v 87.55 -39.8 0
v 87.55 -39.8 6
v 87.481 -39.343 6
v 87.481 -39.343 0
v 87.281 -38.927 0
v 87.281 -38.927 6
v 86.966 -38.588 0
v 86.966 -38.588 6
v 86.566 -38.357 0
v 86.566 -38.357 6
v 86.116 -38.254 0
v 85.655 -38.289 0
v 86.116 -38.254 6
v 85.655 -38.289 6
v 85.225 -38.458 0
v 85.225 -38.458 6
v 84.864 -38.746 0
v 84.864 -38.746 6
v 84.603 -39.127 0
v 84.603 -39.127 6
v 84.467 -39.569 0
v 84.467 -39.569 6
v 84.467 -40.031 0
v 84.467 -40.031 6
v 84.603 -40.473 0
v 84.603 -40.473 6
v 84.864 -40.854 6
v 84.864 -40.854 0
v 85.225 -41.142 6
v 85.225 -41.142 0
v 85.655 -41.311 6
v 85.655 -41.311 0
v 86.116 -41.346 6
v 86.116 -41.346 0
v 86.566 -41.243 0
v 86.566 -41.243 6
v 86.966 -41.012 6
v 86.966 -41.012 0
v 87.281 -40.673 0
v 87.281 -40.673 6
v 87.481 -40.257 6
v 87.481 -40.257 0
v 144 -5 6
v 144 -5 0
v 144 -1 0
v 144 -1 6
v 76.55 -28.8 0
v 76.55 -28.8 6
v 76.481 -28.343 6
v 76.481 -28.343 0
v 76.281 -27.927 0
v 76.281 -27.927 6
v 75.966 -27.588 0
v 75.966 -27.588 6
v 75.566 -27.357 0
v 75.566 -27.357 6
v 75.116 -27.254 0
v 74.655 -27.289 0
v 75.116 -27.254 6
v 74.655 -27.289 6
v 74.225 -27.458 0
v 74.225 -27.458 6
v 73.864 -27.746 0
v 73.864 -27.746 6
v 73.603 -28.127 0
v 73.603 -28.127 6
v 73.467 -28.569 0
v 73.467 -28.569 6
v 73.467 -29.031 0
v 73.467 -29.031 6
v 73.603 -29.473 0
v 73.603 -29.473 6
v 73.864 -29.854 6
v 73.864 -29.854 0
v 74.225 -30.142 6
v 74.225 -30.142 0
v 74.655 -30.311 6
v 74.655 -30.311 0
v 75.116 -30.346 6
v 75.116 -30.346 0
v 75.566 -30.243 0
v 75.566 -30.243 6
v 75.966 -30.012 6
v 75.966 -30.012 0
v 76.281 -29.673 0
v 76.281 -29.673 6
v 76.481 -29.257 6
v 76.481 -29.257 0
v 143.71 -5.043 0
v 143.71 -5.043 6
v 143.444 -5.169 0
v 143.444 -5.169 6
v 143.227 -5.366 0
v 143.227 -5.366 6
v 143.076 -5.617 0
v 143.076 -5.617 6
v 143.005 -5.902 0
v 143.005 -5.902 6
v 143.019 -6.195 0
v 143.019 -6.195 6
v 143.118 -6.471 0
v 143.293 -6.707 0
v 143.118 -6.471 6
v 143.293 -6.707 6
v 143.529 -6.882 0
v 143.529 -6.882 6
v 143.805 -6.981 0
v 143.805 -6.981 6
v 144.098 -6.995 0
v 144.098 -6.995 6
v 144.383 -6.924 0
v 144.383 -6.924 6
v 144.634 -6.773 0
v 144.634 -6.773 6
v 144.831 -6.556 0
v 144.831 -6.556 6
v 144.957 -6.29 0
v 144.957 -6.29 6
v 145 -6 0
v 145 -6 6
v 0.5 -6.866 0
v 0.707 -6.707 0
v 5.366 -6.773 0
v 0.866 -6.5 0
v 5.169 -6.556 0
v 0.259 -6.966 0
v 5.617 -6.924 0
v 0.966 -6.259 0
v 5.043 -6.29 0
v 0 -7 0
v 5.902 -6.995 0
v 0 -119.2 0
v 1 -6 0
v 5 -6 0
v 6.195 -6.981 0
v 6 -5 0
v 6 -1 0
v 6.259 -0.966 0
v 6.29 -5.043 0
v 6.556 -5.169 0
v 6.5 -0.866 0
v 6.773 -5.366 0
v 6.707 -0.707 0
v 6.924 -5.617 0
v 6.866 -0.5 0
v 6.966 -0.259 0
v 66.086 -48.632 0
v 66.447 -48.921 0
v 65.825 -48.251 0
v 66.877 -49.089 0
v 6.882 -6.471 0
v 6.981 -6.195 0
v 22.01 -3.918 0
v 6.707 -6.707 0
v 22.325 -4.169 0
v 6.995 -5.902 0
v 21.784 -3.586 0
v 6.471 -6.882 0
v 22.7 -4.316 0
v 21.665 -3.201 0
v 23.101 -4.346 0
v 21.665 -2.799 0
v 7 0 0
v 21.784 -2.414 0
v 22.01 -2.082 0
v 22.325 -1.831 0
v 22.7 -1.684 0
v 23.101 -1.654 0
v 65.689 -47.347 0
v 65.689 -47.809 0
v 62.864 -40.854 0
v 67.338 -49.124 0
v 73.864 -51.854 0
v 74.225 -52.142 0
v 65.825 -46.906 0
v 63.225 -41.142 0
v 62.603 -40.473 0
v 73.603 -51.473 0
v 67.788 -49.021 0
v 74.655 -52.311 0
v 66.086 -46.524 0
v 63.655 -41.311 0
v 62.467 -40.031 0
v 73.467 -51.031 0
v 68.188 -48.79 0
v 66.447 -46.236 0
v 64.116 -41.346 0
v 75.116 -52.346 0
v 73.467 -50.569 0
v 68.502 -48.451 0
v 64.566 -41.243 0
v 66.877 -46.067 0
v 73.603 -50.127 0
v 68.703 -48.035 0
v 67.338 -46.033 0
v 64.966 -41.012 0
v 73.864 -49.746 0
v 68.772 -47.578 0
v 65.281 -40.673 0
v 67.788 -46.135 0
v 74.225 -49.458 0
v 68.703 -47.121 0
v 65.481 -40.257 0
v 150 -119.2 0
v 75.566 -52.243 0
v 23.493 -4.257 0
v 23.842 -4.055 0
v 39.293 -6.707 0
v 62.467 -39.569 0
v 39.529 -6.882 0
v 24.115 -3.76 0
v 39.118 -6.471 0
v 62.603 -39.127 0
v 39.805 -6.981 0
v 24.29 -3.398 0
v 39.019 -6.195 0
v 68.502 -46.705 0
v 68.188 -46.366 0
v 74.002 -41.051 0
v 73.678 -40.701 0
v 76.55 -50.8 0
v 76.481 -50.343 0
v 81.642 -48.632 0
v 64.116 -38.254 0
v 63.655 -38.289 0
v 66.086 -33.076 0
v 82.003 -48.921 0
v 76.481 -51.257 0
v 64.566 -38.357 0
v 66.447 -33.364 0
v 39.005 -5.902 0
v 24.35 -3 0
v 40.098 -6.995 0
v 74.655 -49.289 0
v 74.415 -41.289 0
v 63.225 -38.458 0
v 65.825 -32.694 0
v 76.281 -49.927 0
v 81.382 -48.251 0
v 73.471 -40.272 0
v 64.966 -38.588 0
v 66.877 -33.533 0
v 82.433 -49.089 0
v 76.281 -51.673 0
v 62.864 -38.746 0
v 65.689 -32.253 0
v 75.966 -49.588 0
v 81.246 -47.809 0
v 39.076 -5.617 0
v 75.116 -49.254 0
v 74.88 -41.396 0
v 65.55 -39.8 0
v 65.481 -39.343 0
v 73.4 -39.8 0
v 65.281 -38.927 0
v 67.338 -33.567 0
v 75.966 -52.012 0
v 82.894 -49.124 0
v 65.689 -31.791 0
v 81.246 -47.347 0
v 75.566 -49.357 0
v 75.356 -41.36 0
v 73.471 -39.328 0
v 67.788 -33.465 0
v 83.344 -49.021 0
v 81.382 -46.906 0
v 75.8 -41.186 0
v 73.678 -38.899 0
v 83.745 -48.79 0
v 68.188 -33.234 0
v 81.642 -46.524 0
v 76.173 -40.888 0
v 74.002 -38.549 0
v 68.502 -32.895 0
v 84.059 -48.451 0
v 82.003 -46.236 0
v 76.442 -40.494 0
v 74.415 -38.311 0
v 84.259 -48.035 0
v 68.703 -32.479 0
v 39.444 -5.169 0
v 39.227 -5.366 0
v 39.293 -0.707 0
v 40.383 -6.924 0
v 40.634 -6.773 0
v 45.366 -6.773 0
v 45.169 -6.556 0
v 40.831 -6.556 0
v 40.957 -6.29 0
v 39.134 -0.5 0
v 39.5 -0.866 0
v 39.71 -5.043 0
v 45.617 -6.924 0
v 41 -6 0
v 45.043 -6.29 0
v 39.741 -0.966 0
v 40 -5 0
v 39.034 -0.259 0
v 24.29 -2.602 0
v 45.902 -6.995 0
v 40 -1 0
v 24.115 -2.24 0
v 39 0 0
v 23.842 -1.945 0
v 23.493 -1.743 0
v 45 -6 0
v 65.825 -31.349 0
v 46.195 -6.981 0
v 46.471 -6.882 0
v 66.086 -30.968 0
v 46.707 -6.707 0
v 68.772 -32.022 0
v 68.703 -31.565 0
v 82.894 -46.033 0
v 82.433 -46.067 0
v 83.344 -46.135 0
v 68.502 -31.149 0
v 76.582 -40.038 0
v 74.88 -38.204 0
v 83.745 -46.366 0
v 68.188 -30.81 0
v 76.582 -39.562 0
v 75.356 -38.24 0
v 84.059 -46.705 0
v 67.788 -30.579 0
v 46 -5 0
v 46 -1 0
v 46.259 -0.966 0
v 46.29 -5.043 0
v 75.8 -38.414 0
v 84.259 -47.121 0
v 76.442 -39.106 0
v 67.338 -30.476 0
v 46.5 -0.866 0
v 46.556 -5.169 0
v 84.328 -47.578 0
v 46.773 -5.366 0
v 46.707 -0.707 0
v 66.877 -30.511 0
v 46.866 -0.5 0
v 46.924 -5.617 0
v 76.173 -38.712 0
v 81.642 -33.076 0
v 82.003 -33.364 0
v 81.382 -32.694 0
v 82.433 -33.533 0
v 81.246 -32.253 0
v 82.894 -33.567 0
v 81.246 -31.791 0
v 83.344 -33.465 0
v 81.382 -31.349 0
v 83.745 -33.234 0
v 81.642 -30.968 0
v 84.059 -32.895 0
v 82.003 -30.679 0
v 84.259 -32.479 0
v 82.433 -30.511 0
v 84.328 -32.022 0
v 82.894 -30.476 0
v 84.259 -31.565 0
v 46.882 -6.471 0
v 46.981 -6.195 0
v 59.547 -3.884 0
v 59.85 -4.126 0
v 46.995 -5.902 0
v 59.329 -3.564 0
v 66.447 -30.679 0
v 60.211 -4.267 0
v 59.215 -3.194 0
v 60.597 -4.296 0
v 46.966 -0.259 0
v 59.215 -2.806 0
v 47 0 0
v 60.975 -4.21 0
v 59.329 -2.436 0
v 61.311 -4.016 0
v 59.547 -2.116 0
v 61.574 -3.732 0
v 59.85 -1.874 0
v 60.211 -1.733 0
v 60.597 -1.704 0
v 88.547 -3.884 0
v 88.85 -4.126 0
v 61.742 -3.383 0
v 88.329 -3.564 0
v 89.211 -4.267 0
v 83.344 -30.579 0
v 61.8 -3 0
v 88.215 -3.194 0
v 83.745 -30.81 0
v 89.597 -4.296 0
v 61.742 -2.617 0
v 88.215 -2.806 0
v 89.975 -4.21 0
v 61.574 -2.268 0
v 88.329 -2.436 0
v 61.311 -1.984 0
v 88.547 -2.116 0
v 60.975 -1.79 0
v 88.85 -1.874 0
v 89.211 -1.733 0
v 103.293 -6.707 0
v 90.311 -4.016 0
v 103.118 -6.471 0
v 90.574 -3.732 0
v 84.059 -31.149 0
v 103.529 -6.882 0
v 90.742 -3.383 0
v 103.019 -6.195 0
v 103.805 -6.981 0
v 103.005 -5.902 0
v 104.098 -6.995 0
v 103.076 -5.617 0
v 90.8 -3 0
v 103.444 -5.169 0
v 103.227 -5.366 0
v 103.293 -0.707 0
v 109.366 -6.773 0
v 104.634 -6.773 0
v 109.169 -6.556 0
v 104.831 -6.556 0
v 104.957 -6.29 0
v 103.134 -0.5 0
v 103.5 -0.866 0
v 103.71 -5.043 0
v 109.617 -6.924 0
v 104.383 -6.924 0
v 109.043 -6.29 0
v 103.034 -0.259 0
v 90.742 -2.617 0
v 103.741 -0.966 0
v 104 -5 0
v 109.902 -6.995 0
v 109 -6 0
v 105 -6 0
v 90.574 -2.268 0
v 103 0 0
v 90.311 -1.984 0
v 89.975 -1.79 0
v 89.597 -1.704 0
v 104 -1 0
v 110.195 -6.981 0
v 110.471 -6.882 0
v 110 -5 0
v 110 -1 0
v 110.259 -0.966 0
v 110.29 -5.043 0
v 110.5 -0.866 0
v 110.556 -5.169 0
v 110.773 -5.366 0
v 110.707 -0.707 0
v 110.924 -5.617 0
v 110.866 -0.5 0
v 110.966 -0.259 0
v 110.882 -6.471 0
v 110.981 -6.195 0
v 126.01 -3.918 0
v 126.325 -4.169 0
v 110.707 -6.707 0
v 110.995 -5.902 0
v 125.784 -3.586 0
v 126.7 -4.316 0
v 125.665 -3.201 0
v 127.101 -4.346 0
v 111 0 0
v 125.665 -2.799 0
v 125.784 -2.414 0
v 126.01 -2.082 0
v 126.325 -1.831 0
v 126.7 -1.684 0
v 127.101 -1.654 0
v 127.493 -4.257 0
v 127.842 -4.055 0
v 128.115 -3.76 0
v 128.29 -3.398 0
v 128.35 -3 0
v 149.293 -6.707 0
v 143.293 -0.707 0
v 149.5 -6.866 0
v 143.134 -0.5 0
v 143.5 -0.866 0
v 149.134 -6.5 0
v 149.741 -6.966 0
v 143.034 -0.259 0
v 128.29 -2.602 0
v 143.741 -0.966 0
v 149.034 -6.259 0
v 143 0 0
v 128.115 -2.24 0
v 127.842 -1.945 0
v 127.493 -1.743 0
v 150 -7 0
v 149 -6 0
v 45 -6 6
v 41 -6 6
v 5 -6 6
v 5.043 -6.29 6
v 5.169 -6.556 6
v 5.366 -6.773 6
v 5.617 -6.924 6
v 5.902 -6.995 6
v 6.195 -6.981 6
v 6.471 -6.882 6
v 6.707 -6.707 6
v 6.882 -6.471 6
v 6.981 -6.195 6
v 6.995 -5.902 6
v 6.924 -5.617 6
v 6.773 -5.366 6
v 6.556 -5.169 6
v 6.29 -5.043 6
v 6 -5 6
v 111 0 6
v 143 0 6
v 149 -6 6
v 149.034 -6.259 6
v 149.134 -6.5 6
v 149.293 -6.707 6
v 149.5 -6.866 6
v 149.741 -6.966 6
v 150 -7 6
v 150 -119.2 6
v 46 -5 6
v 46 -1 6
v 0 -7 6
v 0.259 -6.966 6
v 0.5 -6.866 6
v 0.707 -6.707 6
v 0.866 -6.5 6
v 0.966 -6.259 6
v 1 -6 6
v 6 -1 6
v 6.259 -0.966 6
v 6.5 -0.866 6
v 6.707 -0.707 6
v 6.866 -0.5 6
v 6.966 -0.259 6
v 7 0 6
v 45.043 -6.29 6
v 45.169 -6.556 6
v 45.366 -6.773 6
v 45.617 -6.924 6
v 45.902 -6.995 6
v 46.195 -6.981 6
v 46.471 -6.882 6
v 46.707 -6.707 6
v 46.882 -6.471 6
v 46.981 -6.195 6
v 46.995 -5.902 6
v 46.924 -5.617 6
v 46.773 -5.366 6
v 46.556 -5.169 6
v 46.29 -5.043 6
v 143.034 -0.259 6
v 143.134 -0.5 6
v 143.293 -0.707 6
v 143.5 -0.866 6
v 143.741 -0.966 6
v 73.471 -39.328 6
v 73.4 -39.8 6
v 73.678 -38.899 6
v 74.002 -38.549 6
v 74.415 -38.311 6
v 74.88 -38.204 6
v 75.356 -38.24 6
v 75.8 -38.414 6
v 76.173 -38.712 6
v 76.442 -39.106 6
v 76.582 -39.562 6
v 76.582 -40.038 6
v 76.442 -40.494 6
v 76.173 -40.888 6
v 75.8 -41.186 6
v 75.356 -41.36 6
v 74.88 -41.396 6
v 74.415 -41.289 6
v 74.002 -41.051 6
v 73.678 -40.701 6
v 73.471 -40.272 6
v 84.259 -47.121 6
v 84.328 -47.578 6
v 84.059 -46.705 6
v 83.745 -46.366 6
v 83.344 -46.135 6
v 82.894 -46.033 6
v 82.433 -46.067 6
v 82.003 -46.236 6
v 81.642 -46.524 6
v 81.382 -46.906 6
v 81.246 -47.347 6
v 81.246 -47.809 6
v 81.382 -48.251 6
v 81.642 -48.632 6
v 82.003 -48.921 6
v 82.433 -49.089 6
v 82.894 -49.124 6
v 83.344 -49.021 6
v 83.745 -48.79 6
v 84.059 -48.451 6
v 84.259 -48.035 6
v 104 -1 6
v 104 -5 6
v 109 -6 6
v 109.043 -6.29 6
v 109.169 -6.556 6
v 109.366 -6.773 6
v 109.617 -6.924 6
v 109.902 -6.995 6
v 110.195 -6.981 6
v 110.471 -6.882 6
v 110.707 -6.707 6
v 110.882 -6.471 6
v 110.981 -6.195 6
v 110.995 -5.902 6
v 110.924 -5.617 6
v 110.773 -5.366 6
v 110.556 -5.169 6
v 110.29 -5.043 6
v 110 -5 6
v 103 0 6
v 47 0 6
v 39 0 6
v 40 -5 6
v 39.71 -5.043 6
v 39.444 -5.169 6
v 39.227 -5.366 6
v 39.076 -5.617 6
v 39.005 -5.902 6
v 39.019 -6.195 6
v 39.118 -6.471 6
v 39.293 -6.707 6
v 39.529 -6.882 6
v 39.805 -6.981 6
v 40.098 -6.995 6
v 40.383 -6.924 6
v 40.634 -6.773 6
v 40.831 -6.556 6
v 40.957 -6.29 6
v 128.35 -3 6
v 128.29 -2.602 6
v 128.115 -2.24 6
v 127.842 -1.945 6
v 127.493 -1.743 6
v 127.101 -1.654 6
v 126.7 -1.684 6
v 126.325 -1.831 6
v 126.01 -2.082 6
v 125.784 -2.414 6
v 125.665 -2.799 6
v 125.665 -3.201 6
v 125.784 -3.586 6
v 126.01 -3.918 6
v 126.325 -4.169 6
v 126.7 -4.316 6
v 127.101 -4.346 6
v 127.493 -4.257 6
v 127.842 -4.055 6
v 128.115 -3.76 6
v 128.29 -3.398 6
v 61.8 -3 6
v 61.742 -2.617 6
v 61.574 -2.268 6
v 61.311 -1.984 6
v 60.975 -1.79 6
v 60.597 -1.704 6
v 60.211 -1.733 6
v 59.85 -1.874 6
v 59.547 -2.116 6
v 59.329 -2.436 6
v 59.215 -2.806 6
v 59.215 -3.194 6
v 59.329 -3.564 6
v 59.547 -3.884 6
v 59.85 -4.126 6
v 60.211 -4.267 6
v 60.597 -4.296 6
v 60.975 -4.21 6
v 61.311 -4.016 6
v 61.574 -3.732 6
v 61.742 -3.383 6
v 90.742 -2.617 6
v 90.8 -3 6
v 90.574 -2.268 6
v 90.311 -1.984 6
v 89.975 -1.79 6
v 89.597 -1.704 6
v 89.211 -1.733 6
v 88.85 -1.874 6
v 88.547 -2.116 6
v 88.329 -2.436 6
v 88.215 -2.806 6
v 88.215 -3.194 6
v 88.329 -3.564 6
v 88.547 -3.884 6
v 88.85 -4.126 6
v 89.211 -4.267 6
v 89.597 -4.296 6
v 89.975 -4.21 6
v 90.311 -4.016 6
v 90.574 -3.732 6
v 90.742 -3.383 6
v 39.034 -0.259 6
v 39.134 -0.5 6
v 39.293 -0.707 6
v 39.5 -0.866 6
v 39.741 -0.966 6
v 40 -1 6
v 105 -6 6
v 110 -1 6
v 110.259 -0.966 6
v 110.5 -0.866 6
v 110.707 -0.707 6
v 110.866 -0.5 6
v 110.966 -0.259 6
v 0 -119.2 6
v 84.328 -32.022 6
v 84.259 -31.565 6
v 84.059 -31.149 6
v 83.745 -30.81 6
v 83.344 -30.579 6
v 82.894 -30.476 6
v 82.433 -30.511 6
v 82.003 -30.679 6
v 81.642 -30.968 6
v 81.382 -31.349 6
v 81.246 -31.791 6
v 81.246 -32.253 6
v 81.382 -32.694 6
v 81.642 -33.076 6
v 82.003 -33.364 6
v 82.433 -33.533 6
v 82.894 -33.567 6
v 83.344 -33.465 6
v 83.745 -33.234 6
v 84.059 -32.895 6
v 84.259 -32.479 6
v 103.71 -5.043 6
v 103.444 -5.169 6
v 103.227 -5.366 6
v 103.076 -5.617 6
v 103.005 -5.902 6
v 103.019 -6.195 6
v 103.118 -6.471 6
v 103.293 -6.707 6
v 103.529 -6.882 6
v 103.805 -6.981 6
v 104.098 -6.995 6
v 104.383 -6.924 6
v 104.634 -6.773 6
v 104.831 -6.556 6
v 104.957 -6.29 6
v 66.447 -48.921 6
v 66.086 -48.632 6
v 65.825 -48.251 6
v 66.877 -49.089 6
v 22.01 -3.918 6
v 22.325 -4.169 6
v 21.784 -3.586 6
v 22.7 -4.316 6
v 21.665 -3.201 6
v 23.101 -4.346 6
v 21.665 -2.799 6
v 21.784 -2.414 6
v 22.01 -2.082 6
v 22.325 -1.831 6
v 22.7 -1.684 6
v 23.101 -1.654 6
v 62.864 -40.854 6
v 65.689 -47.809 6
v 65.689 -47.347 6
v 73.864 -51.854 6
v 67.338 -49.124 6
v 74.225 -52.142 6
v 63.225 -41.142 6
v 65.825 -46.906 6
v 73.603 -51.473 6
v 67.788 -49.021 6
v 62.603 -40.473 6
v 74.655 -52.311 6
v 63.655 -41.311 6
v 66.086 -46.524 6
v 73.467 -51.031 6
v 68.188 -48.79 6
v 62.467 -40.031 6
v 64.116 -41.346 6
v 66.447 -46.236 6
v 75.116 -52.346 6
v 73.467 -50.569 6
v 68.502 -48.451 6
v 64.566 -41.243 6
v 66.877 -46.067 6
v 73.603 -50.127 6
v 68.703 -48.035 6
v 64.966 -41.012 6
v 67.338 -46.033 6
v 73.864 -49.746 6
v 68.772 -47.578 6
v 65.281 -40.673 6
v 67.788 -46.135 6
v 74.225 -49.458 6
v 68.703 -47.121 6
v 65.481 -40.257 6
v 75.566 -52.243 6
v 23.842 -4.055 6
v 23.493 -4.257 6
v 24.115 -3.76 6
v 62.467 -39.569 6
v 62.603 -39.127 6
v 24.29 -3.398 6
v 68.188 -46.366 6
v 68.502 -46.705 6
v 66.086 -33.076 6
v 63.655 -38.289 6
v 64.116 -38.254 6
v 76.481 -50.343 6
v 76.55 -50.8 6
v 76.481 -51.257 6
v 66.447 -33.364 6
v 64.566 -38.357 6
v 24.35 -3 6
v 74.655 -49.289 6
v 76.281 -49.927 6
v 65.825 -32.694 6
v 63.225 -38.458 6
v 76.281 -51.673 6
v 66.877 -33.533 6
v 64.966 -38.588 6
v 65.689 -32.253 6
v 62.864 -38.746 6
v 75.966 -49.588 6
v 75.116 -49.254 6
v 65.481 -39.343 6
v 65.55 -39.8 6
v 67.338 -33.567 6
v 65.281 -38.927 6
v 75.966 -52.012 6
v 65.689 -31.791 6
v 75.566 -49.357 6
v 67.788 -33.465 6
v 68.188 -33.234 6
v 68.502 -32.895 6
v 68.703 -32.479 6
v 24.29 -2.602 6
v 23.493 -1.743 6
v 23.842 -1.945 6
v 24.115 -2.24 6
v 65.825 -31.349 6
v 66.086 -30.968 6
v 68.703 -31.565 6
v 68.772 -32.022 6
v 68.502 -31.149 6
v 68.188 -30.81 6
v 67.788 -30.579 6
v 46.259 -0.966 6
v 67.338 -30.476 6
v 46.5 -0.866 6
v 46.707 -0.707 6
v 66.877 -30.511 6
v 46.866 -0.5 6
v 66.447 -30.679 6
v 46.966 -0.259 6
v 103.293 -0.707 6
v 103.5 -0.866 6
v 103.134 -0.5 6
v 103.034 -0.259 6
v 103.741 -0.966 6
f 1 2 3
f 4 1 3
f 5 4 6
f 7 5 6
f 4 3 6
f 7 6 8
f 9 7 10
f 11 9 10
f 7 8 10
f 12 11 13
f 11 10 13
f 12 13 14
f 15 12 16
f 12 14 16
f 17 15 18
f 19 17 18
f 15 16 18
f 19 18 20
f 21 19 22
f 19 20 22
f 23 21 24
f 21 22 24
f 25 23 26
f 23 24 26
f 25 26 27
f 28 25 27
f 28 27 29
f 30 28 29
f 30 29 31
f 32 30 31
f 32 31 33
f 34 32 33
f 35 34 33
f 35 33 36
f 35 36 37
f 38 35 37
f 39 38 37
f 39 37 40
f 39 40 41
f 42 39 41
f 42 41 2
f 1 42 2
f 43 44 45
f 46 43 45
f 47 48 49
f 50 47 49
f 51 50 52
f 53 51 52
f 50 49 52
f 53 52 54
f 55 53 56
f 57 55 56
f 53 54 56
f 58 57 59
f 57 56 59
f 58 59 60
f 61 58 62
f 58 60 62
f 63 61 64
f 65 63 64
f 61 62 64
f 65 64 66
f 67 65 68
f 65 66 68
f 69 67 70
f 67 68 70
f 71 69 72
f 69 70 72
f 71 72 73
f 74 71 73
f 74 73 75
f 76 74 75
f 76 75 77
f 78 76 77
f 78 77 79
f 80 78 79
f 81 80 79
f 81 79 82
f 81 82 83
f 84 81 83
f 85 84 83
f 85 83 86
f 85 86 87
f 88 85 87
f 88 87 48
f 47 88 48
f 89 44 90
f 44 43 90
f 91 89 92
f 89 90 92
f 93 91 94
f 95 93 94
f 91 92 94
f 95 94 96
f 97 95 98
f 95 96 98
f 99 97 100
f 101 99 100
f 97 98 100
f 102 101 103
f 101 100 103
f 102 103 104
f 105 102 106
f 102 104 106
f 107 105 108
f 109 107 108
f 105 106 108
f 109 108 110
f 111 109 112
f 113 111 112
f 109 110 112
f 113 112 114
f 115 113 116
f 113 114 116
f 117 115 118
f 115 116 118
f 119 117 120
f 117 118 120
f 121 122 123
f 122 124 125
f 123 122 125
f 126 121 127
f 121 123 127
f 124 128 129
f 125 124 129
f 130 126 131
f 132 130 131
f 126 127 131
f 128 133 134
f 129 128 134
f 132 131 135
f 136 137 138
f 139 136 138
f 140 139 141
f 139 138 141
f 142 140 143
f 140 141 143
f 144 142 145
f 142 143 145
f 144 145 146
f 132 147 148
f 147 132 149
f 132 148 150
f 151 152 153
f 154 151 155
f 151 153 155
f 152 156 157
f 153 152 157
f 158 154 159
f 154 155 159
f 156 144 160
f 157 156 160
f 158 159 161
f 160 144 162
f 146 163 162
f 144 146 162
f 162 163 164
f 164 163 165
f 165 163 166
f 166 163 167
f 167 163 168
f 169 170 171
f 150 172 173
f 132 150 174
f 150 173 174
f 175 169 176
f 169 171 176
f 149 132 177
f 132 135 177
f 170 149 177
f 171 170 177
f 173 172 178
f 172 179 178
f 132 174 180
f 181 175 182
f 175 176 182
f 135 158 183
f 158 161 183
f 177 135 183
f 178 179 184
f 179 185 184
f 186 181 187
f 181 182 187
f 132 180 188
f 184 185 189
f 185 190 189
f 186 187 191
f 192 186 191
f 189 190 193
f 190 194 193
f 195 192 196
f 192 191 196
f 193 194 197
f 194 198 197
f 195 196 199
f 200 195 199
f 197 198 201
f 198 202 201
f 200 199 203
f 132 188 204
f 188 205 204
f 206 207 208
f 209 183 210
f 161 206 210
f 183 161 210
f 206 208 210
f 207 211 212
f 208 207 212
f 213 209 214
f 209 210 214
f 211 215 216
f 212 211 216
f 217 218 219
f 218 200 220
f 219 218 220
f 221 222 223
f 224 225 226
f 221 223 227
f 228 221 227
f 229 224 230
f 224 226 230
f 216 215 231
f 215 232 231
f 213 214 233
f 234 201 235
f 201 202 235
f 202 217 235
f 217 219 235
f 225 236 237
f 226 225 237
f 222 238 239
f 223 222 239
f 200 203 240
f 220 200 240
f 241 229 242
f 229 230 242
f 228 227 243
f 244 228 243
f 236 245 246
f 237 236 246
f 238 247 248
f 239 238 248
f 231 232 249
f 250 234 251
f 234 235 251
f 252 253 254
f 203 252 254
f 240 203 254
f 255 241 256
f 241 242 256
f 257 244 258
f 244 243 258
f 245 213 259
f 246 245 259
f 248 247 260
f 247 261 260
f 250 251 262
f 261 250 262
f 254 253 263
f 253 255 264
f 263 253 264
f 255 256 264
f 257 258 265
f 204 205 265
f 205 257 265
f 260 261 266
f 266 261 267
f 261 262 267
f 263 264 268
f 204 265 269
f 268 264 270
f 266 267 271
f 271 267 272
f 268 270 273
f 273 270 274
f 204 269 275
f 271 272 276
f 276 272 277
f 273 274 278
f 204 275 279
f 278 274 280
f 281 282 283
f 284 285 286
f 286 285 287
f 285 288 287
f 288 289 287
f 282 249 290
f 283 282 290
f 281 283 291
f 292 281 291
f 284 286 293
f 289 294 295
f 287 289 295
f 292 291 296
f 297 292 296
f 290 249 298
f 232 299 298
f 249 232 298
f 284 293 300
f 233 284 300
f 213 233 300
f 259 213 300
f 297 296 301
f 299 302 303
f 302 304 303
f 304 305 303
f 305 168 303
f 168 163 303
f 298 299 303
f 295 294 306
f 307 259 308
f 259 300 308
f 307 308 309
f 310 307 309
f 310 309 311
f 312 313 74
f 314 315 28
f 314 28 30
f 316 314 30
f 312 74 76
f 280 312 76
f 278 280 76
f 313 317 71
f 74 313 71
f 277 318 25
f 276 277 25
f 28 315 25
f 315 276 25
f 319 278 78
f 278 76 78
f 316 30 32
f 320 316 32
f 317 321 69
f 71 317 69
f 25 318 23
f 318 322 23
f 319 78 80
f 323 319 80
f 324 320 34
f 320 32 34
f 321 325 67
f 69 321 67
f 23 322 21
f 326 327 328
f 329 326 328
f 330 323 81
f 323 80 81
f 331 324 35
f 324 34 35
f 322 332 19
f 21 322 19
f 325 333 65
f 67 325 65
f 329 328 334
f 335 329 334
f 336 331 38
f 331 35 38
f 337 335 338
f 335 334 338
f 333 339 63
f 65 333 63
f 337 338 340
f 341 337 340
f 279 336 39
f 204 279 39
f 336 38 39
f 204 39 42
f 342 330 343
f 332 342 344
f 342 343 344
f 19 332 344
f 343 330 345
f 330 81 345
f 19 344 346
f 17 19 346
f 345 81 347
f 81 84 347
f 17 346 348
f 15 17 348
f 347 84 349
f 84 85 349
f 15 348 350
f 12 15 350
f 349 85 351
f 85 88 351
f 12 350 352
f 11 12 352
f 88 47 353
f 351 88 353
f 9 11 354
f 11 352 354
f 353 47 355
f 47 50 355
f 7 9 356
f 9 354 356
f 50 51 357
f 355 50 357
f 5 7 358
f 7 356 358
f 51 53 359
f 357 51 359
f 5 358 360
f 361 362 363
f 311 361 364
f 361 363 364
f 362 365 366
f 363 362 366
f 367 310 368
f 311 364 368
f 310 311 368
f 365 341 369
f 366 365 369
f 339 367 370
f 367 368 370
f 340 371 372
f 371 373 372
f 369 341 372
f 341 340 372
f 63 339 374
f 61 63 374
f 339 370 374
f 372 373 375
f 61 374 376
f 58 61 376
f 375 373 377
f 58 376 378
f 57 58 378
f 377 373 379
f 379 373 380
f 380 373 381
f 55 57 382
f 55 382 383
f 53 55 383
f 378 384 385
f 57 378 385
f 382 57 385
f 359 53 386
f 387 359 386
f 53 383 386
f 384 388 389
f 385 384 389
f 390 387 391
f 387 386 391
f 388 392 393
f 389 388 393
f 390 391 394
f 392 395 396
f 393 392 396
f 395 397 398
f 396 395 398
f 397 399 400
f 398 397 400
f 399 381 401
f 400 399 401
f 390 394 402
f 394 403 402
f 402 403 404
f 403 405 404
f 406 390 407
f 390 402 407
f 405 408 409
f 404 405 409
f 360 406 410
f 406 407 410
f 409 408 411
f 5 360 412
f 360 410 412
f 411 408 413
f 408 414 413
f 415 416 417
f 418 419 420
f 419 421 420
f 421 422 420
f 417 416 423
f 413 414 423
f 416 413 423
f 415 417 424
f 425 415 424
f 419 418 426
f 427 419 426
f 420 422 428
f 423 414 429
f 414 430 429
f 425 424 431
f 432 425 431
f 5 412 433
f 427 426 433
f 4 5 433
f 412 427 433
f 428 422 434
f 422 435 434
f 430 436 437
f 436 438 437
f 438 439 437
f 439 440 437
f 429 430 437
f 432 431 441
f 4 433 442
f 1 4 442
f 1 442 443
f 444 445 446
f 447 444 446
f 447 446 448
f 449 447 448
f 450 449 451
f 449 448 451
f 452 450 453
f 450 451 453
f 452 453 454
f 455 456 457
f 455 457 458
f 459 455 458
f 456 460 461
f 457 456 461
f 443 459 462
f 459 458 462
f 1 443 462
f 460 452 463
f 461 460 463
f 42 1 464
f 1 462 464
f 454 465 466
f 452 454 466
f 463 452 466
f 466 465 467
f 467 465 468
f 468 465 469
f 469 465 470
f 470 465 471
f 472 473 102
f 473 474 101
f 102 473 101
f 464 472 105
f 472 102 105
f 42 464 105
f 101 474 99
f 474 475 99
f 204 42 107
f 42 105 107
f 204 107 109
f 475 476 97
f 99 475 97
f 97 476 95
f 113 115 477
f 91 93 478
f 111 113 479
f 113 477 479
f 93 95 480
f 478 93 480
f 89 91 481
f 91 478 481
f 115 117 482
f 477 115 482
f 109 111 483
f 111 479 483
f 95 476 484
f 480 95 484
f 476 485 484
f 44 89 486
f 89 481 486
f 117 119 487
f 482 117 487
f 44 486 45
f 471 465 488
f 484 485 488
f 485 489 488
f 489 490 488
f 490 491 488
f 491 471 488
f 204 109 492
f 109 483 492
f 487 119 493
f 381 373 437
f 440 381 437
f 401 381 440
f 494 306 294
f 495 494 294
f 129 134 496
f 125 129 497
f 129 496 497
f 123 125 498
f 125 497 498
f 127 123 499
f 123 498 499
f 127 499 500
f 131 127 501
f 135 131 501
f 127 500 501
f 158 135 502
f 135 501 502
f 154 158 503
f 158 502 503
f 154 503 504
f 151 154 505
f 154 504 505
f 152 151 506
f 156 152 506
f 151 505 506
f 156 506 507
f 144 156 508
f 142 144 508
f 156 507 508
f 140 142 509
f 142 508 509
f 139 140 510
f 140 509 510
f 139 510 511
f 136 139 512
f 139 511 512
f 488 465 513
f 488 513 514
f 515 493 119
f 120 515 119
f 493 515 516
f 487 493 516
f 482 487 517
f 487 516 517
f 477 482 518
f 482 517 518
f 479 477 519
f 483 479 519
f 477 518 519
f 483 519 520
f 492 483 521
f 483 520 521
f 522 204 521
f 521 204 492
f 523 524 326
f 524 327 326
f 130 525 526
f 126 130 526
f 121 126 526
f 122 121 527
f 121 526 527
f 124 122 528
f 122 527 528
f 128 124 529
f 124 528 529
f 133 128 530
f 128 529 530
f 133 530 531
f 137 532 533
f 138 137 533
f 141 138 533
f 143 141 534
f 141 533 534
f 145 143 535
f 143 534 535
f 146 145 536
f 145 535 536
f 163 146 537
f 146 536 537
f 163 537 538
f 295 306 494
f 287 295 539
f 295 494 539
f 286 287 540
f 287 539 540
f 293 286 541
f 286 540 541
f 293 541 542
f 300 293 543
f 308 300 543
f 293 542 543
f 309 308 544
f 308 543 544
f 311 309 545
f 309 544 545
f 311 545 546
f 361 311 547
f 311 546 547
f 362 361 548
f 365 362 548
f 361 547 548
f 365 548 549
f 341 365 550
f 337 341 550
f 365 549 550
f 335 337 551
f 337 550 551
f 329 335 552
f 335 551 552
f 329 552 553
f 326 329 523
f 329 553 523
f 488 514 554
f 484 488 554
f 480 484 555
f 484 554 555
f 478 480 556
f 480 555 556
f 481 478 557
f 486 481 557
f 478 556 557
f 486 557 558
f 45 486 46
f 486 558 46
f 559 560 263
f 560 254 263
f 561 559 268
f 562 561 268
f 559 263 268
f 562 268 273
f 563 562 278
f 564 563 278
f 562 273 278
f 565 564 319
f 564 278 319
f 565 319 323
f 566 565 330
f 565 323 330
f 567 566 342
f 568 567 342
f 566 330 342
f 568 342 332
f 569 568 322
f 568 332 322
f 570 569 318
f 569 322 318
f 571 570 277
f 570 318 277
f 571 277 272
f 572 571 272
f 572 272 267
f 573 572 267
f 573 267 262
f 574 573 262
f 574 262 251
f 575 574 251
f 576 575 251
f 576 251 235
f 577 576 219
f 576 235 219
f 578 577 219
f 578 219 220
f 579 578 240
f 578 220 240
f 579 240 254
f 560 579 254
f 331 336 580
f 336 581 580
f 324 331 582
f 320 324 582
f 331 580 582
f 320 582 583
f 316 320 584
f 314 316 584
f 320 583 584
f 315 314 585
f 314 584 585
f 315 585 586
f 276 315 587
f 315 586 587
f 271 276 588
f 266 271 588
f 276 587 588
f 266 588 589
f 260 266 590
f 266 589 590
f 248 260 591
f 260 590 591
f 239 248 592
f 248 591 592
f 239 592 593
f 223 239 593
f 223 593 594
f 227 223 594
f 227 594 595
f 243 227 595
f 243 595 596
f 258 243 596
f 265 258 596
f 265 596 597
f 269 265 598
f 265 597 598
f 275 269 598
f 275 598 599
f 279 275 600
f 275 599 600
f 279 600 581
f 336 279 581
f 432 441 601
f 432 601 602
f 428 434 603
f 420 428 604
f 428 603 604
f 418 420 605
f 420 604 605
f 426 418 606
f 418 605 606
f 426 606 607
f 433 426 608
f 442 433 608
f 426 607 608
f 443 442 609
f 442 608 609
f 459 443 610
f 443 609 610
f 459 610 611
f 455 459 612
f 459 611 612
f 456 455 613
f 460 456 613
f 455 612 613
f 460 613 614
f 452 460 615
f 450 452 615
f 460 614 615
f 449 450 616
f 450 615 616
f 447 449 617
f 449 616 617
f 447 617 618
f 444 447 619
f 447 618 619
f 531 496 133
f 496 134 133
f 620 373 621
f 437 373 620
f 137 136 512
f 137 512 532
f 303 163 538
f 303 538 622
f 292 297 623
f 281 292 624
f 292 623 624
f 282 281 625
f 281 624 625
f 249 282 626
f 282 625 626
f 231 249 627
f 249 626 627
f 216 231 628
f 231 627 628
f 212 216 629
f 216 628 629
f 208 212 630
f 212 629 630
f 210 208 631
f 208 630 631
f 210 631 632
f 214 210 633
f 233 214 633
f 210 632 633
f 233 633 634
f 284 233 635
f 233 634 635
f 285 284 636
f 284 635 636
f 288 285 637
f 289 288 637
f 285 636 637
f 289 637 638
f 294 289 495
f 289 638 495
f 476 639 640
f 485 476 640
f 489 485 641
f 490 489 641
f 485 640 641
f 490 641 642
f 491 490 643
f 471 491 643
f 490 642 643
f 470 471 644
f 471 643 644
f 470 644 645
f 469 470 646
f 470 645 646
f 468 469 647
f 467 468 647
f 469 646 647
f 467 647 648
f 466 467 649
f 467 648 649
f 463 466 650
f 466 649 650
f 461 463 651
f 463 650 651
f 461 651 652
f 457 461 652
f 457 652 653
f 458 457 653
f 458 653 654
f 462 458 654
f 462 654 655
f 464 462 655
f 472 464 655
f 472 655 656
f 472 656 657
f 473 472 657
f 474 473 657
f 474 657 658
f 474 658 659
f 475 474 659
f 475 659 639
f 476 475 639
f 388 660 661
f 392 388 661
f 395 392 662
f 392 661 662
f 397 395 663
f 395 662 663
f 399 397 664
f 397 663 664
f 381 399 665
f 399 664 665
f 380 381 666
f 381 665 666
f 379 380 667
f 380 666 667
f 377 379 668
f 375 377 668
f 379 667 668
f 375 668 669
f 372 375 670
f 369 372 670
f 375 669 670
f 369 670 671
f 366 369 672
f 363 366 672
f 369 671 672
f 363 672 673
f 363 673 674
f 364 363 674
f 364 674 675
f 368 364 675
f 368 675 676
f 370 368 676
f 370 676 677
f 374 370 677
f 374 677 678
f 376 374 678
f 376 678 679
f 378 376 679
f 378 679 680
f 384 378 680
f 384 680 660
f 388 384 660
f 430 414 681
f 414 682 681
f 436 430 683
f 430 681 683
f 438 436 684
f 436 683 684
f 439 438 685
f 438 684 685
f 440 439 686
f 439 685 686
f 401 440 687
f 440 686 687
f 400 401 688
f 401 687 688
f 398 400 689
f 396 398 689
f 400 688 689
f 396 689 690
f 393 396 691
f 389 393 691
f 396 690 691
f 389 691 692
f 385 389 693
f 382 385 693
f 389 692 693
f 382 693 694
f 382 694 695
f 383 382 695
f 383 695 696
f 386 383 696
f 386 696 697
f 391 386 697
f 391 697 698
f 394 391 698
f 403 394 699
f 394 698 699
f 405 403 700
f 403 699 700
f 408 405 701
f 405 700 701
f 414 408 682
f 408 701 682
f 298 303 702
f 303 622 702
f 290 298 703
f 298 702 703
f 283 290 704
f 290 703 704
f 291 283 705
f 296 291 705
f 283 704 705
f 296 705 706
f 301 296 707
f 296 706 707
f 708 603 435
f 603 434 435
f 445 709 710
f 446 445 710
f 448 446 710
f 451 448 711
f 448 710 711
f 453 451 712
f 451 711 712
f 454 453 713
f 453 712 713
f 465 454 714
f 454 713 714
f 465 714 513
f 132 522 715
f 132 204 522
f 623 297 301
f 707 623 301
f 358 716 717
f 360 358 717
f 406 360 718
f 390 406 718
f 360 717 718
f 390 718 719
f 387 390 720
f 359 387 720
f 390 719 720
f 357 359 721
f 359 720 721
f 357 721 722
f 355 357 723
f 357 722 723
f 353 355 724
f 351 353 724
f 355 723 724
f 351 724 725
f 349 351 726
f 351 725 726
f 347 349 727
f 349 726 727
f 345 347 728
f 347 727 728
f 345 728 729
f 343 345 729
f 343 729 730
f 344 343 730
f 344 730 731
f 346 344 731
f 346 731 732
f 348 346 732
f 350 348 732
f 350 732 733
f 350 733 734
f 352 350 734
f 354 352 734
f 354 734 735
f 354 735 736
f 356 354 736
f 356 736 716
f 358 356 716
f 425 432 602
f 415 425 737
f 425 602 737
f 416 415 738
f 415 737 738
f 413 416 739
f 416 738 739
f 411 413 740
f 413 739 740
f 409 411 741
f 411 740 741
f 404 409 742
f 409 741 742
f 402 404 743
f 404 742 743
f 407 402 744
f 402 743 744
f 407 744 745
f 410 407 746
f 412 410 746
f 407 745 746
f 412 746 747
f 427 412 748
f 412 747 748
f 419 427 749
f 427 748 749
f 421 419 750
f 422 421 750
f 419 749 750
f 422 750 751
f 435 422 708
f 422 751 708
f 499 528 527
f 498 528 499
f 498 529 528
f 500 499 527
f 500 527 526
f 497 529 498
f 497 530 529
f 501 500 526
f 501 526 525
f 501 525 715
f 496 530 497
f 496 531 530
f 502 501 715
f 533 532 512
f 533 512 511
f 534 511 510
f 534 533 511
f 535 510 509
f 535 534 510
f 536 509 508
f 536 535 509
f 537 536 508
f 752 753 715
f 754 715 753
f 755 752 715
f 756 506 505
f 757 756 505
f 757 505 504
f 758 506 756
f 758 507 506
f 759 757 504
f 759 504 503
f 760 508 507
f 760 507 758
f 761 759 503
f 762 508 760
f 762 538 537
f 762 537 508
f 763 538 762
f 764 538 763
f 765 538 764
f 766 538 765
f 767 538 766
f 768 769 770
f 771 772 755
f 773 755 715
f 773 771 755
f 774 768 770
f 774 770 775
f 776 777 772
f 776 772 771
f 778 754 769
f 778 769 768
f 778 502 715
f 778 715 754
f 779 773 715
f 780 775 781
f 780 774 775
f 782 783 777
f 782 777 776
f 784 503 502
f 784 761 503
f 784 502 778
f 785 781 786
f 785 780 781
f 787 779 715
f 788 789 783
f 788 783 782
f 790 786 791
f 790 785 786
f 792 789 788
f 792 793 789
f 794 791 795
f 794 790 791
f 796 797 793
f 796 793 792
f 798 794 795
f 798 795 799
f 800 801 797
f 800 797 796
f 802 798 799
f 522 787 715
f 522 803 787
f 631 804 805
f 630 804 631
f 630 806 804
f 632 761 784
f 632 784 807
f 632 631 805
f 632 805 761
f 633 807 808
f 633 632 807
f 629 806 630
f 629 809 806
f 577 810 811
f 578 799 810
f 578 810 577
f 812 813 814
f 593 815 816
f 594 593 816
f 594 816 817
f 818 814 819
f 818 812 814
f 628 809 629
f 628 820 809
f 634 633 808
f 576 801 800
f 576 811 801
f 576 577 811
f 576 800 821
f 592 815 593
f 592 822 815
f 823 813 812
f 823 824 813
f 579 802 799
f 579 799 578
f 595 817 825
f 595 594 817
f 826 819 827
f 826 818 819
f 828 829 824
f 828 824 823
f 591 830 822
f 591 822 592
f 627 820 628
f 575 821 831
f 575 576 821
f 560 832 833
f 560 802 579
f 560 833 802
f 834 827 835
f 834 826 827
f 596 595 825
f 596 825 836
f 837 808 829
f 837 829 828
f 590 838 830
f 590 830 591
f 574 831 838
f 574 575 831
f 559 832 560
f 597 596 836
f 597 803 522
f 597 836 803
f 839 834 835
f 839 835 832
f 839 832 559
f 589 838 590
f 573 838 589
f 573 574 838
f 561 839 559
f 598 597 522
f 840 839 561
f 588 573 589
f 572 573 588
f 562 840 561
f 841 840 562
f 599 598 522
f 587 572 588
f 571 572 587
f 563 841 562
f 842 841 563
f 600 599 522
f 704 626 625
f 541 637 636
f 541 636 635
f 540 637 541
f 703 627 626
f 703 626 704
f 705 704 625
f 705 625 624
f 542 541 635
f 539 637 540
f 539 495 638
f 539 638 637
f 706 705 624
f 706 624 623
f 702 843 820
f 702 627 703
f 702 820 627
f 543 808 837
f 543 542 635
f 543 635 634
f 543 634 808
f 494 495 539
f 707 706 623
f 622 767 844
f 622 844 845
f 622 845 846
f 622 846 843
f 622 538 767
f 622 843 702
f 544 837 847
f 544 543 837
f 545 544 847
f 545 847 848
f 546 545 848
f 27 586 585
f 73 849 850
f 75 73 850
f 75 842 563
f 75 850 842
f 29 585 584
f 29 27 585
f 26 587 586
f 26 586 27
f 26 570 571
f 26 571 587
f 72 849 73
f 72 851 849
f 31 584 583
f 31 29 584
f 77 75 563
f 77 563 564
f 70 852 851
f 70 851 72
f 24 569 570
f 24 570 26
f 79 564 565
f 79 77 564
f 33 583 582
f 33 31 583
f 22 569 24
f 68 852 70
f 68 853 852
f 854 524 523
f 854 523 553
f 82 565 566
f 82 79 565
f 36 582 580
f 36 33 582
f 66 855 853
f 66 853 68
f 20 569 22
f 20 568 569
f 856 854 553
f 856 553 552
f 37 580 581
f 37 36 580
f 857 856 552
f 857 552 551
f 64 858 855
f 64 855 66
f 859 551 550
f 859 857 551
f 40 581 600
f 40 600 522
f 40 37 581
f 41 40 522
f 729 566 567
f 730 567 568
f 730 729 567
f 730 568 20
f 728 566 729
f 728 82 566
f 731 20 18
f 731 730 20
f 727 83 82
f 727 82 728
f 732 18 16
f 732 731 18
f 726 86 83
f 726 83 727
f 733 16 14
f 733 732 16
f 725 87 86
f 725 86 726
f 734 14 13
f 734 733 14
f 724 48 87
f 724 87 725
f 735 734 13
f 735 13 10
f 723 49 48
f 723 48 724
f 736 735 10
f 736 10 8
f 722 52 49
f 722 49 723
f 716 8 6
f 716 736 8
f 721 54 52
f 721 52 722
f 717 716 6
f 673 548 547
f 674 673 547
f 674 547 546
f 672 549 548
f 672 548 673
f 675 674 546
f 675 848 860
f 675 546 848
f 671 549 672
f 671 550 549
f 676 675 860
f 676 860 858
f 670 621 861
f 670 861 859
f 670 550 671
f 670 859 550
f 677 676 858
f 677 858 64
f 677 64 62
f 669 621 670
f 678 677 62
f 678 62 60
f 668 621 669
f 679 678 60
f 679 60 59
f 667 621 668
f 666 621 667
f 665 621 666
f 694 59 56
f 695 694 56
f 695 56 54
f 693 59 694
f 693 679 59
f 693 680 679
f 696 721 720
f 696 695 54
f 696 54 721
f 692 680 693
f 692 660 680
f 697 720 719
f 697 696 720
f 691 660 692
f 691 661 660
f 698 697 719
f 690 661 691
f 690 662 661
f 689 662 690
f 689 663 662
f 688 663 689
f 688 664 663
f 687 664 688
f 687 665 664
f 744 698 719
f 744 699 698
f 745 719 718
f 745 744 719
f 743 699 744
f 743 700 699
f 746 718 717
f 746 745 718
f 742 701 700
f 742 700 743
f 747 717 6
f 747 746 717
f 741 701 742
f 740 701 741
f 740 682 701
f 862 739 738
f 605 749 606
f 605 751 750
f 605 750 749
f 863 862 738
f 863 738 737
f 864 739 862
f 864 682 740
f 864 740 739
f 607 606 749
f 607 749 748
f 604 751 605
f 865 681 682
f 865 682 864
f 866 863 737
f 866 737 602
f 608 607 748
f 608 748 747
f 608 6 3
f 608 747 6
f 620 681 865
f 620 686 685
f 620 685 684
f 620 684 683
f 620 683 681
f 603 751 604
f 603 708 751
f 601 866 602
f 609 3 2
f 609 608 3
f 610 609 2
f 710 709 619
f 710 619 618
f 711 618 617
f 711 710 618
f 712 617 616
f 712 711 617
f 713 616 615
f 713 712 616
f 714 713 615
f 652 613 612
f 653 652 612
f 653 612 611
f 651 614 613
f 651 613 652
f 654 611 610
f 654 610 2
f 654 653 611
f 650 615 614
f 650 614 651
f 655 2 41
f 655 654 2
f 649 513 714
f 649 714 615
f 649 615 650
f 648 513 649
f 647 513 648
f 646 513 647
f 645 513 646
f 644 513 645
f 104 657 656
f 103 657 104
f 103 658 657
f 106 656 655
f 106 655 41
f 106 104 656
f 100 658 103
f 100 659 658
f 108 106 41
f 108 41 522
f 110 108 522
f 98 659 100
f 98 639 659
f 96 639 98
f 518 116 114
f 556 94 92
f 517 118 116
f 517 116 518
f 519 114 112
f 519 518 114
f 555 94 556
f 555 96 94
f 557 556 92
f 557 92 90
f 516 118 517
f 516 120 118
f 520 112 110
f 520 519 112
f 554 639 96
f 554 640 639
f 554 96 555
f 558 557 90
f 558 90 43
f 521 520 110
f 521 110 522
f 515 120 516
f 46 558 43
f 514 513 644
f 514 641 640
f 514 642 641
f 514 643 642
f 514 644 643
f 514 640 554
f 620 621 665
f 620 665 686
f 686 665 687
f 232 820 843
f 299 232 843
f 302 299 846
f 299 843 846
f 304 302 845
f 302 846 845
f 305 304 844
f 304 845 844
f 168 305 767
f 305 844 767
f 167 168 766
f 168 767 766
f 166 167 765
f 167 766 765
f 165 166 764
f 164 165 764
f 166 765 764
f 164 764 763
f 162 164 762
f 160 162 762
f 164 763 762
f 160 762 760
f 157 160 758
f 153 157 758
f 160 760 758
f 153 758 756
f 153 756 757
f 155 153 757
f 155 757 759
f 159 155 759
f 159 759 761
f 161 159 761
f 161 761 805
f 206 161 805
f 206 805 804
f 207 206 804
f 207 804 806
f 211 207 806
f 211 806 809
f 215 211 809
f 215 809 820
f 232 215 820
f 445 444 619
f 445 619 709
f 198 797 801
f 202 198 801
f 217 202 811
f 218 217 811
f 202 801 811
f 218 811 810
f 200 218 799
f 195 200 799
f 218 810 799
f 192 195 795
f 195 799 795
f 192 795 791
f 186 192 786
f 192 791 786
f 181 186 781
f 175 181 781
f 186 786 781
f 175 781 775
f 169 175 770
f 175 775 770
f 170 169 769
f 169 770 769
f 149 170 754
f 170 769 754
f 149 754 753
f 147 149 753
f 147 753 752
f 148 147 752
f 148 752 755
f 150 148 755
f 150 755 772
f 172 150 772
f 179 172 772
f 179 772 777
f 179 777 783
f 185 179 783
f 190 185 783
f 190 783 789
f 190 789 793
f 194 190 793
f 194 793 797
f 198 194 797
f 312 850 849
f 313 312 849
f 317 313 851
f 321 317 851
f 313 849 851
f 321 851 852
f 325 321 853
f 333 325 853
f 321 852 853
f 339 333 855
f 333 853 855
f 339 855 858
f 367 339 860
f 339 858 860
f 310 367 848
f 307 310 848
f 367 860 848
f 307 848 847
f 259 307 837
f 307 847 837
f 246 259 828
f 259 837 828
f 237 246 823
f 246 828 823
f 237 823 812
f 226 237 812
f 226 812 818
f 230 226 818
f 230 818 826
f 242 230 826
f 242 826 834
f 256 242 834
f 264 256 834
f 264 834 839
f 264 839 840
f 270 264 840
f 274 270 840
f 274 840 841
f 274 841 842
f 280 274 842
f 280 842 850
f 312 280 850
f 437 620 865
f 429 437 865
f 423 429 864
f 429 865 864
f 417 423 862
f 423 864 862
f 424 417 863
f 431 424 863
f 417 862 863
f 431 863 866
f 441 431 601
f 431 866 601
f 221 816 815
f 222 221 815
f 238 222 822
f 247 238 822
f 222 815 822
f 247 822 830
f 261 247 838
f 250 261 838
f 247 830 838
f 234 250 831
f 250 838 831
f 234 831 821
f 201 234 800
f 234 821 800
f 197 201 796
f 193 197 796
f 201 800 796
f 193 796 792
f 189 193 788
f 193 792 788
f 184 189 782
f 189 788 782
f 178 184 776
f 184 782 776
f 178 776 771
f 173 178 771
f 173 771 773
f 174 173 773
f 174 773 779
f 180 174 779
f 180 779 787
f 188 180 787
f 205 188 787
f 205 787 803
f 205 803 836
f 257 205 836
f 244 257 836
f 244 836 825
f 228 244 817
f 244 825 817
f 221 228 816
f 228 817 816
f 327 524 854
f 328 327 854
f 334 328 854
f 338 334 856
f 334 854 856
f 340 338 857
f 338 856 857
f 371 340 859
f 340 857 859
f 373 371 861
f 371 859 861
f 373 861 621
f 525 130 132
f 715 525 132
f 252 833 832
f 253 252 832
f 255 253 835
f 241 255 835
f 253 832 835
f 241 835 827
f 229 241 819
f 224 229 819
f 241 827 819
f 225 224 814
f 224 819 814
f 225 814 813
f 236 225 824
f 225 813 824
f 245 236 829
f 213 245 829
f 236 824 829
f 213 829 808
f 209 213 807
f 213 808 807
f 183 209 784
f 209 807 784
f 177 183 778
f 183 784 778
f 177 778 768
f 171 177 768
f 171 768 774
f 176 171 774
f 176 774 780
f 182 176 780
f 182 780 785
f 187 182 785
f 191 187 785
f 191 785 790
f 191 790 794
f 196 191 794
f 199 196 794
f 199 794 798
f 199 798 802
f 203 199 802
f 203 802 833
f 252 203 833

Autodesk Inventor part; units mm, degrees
ref_plane "YZ Plane" through (0, 0, 0) normal (1, 0, 0) x (0, 1, 0)
ref_plane "XZ Plane" through (0, 0, 0) normal (0, 1, 0) x (-1, 0, 0)
ref_plane "XY Plane" through (0, 0, 0) normal (0, 0, 1) x (1, 0, 0)
sketch "스케치1" plane through (0, 0, 0) normal (0, 0, 1) x (1, 0, 0)
  line L0 (118.1968, 6) -> (118.1968, 0)
  line L1 (0, 0) -> (2.3, 0) projected
  line L2 (2.3, 0) -> (2.3, -6) projected
  line L3 (150, -6) -> (2.3, -6) projected
  line L4 (150, -6) -> (150, 6) projected
  line L5 (0, 6) -> (150, 6) projected
  line L6 (0, 0) -> (0, 6) projected
  line L7 (150, -6) -> (0, -6)
  line L8 (0, -6) -> (0, 0)
  line L9 (0, 0) -> (150, 0)
  line L10 (150, 0) -> (150, -6)
  line L11 (150, -6) -> (144, -6)
  line L12 (144, -6) -> (144, 0)
  line L13 (144, 0) -> (150, 0)
  line L14 (150, 0) -> (150, -6)
  line L15 (122.25, 6) -> (131.75, 6) projected
  line L16 (128.025, 6) -> (128.025, 0)
  line L17 (125.975, 6) -> (125.975, 0)
  line L18 (127, 0) -> (127, 6)
  line L19 (104, 0) -> (104, -6)
  line L20 (104, -6) -> (110, -6)
  line L21 (110, -6) -> (110, 0)
  line L22 (110, 0) -> (104, 0)
  line L23 (104, 0) -> (104, -6)
  line L24 (75, -6) -> (75, 6)
  line L25 (0, 0) -> (0, -6)
  line L26 (0, -6) -> (6, -6)
  line L27 (6, 0) -> (0, 0)
  line L28 (0, 0) -> (0, -6)
  line L29 (40, 0) -> (46, 0)
  line L30 (150, -6) -> (144, -6)
  line L31 (144, -6) -> (144, 0)
  line L32 (144, 0) -> (150, 0)
  line L33 (150, 0) -> (150, -6)
  line L34 (110, -6) -> (104, -6)
  line L35 (104, -6) -> (104, 0)
  line L36 (104, 0) -> (110, 0)
  line L37 (110, 0) -> (110, -6)
  line L38 (0, 0) -> (0, -6)
  line L39 (0, -6) -> (6, -6)
  line L40 (6, -6) -> (6, 0)
  line L41 (6, 0) -> (0, 0)
  line L42 (0, 0) -> (0, -6)
  line L43 (40, -6) -> (40, 0)
  line L44 (46, -6) -> (40, -6)
  line L45 (46, 0) -> (46, -6)
  line L46 (46, 0) -> (46, -6)
  line L47 (40, 0) -> (46, 0)
  line L48 (0, -6) -> (6, -6)
  line L49 (6, -6) -> (6, 0)
  line L50 (6, 0) -> (0, 0)
  line L51 (0, 0) -> (0, -6)
  line L52 (40, -6) -> (46, -6)
  line L53 (46, -6) -> (46, 0)
  line L54 (46, 0) -> (40, 0)
  line L55 (40, 0) -> (40, -6)
  line L56 (150, 0) -> (0, 0)
  line L57 (0, 0) -> (0, -125.2)
  line L58 (0, -125.2) -> (150, -125.2)
  line L59 (150, -125.2) -> (150, 0)
  line L60 (150, -62.6) -> (0, -62.6)
  line L61 (0, -125.2) -> (2.3, -125.2)
  line L62 (2.3, -125.2) -> (2.3, -119.2)
  line L63 (150, -119.2) -> (2.3, -119.2)
  line L64 (150, -119.2) -> (0, -119.2)
  line L65 (0, -119.2) -> (0, -125.2)
  line L66 (0, -125.2) -> (150, -125.2)
  line L67 (150, -125.2) -> (150, -119.2)
  line L68 (150, -119.2) -> (144, -119.2)
  line L69 (144, -119.2) -> (144, -125.2)
  line L70 (144, -125.2) -> (150, -125.2)
  line L71 (150, -125.2) -> (150, -119.2)
  line L72 (110, -119.2) -> (110, -125.2)
  line L73 (104, -119.2) -> (110, -119.2)
  line L74 (104, -125.2) -> (104, -119.2)
  line L75 (104, -125.2) -> (104, -119.2)
  line L76 (110, -125.2) -> (104, -125.2)
  line L77 (40, -125.2) -> (46, -125.2)
  line L78 (0, -125.2) -> (0, -119.2)
  line L79 (0, -119.2) -> (6, -119.2)
  line L80 (0, -125.2) -> (0, -119.2)
  line L81 (6, -125.2) -> (0, -125.2)
  line L82 (150, -119.2) -> (144, -119.2)
  line L83 (144, -119.2) -> (144, -125.2)
  line L84 (144, -125.2) -> (150, -125.2)
  line L85 (150, -125.2) -> (150, -119.2)
  line L86 (110, -119.2) -> (104, -119.2)
  line L87 (104, -119.2) -> (104, -125.2)
  line L88 (104, -125.2) -> (110, -125.2)
  line L89 (110, -125.2) -> (110, -119.2)
  line L90 (0, -125.2) -> (0, -119.2)
  line L91 (0, -119.2) -> (6, -119.2)
  line L92 (6, -119.2) -> (6, -125.2)
  line L93 (6, -125.2) -> (0, -125.2)
  line L94 (0, -125.2) -> (0, -119.2)
  line L95 (6, -119.2) -> (6, -125.2)
  line L96 (0, -125.2) -> (0, -119.2)
  line L97 (0, -119.2) -> (6, -119.2)
  line L98 (6, -125.2) -> (0, -125.2)
  line L99 (40, -119.2) -> (40, -125.2)
  line L100 (40, -125.2) -> (40, -119.2)
  line L101 (46, -119.2) -> (40, -119.2)
  line L102 (46, -125.2) -> (46, -119.2)
  line L103 (46, -125.2) -> (46, -119.2)
  line L104 (46, -119.2) -> (46, -125.2)
  line L105 (40, -119.2) -> (46, -119.2)
  line L106 (46, -125.2) -> (40, -125.2)
  line L107 (40, -125.2) -> (46, -125.2)
  line L108 (150, -125.2) -> (0, -125.2)
  point P0 (21.975, 0)
  point P1 (24.025, 0)
  point P2 (31.8032, 0)
  point P3 (21.975, 0)
  point P4 (24.025, 0)
  point P5 (23, 0)
  point P6 (118.1968, -125.2)
  point P7 (128.025, -125.2)
  point P8 (125.975, -125.2)
  point P9 (127, -125.2)
  point P10 (75, -119.2)
  point P11 (24.025, -125.2)
  point P12 (21.975, -125.2)
  point P13 (24.025, -125.2)
  point P14 (23, -125.2)
  point P15 (21.975, -125.2)
  point P16 (31.8032, -125.2)
  dimension "d0" = 125.2
extrude "돌출1" add sketch "스케치1" along normal blind 6 contours L9 L12 L3 L21 | L24 L3 L45 L9 | L9 L19 L3 L24 | L3 L59 L60 L57 L7 | L43 L3 L40 L9 | L60 L59 L63 L64 L57
sketch "스케치2" plane through (0, 0, 0) normal (0, 0, -1) x (-1, 0, 0)
  circle A0 centre (-72.2193, -29.1573) radius 1.55 projected
  circle A1 centre (-75, -39.8) radius 1.5 projected
  circle A2 centre (-75, -39.8) radius 13.9 projected
  circle A3 centre (-75, -39.8) radius 5.2 projected
  circle A4 centre (-75, -39.8) radius 1.6
  point P0 (0, 0)
  dimension "d5" = 0.1
extrude "돌출2" cut sketch "스케치2" against normal up to next contours A1 | A4
sketch "스케치5" plane through (0, 0, 6) normal (0, 0, 1) x (1, 0, 0)
  line L0 (6, 0) -> (6, -6) projected
  line L1 (6, -6) -> (0, -6) projected
  line L2 (0, -6) -> (0, -119.2) projected
  line L3 (150, -119.2) -> (150, -6) projected
  line L4 (150, -6) -> (144, -6) projected
  line L5 (144, -6) -> (144, 0) projected
  line L6 (144, 0) -> (110, 0) projected
  line L7 (110, 0) -> (110, -6) projected
  line L8 (110, -6) -> (104, -6) projected
  line L9 (104, -6) -> (104, 0) projected
  line L10 (104, 0) -> (46, 0) projected
  line L11 (46, 0) -> (46, -6) projected
  line L12 (46, -6) -> (40, -6) projected
  line L13 (40, -6) -> (40, 0) projected
  line L14 (40, 0) -> (6, 0) projected
  circle A0 centre (75, -39.8) radius 1.6 projected
  circle A1 centre (40, -6) radius 1
  circle A2 centre (46, -6) radius 1
  circle A3 centre (40, 0) radius 1
  circle A4 centre (46, 0) radius 1
  circle A5 centre (6, 0) radius 1
  line L15 (6, 0) -> (6, -6) projected
  circle A6 centre (6, -6) radius 1
  circle A7 centre (0, -6) radius 1
  circle A8 centre (104, -6) radius 1
  circle A9 centre (104, 0) radius 1
  line L16 (110, -6) -> (104, -6) projected
  circle A10 centre (110, -6) radius 1
  circle A11 centre (110, 0) radius 1
  circle A12 centre (144, -6) radius 1
  line L17 (144, 0) -> (110, 0) projected
  circle A13 centre (144, 0) radius 1
  circle A14 centre (150, -6) radius 1
  circle A15 centre (123.8, -69.5) radius 1
  circle A16 centre (123.8, -63.1) radius 1
  circle A17 centre (130.2, -69.5) radius 1
  line L18 (130.2, -69.5) -> (130.2, -63.1) projected
  circle A18 centre (130.2, -63.1) radius 1
  circle A19 centre (19.8, -69.5) radius 1
  circle A20 centre (19.8, -63.1) radius 1
  circle A21 centre (26.2, -69.5) radius 1
  circle A22 centre (26.2, -63.1) radius 1
  line L19 (0, -119.2) -> (150, -119.2) projected
  point P0 (0, 0)
  point P1 (149, -6)
  point P2 (150, -7)
  point P3 (144, -5)
  point P4 (145, -6)
  point P5 (143, 0)
  point P6 (144, -1)
  dimension "d32" = 2
  dimension "d33" = 2
  dimension "d34" = 2
  dimension "d35" = 2
  dimension "d36" = 2
  dimension "d37" = 2
  dimension "d38" = 2
  dimension "d39" = 2
  dimension "d40" = 2
  dimension "d41" = 2
  dimension "d42" = 2
  dimension "d43" = 2
  dimension "d44" = 2
  dimension "d45" = 2
  dimension "d46" = 2
  dimension "d47" = 2
  dimension "d48" = 2
  dimension "d49" = 2
  dimension "d50" = 2
  dimension "d51" = 2
  dimension "d52" = 2
  dimension "d53" = 2
extrude "돌출5" cut sketch "스케치5" against normal up to next contours L14 A5 L0 | L0 A5 L14 | A6 L1 L0 | L0 L1 A6 | A3 L13 L14 | L14 L13 A3 | A7 L2 L1 | L1 L2 A7 | A1 L12 L13 | L13 L12 A1 | A2 L11 L12 | L12 L11 A2 | A14 L4 L3 | A4 L10 L11 | L11 L10 A4 | A12 L5 L4 | A9 L9 L10 | L10 L9 A9 | A13 L6 L5 | A8 L8 L9 | L9 L8 A8 | A11 L7 L6 | L6 L7 A11 | A10 L7 L8 | L8 L7 A10 picked at (149.7812, -6.6253) picked at (143.8112, -6.634) picked at (143.7812, -0.6253)
sketch "스케치6" plane through (0, 0, 6) normal (0, 0, 1) x (1, 0, 0)
  line L0 (6, -6) -> (6, 0) projected
  line L1 (0, 0) -> (6, 0) projected
  line L2 (0, -6) -> (0, 0) projected
  line L3 (0, -6) -> (6, -6) projected
  line L4 (40, 0) -> (40, -6) projected
  line L5 (40, -6) -> (46, -6) projected
  line L6 (46, -6) -> (46, 0) projected
  line L7 (40, 0) -> (46, 0) projected
  line L8 (40, 0) -> (6, 0)
  line L9 (23, 0) -> (23, -6)
  circle A0 centre (23, -3) radius 1.35
  line L10 (104, 0) -> (104, -6) projected
  line L11 (104, -6) -> (110, -6) projected
  line L12 (110, -6) -> (110, 0) projected
  line L13 (104, 0) -> (110, 0) projected
  line L14 (144, 0) -> (144, -6) projected
  line L15 (144, -6) -> (150, -6) projected
  line L16 (150, -6) -> (150, 0) projected
  line L17 (144, 0) -> (150, 0) projected
  line L18 (104, -3) -> (46, -3)
  line L19 (75, -3) -> (75, 0)
  line L20 (103, 0) -> (47, 0) projected
  line L21 (75, -3) -> (104, -3)
  line L22 (89.5, -3) -> (89.5, 0)
  line L23 (75, -3) -> (46, -3)
  line L24 (60.5, -3) -> (60.5, 0)
  circle A1 centre (89.5, -3) radius 1.3
  circle A2 centre (60.5, -3) radius 1.3
  circle A3 centre (127, -3) radius 1.35
  point P0 (127, -6)
  dimension "d58" = 2.6
  dimension "d59" = 2.6
extrude "돌출6" cut sketch "스케치6" against normal up to next contours A2 L24 L18 | L18 A2 | A0 L9 | L9 A0 | L24 A2 L18 | A1 L22 L18 | L18 A1 | L22 A1 L18 | A3
sketch "스케치13" plane through (0, 0, 6) normal (0, 0, 1) x (1, 0, 0)
  circle A0 centre (82.7782, -32.0218) radius 1.55 projected
  circle A1 centre (82.7782, -32.0218) radius 1.55 projected
  circle A2 centre (75, -28.8) radius 1.55 projected
  circle A3 centre (75, -39.8) radius 1.6 projected
  circle A4 centre (82.7782, -32.0218) radius 1.55
  circle A5 centre (75, -28.8) radius 1.55
  circle A6 centre (67.2218, -32.0218) radius 1.55
  circle A7 centre (64, -39.8) radius 1.55
  circle A8 centre (67.2218, -47.5782) radius 1.55
  circle A9 centre (75, -50.8) radius 1.55
  circle A10 centre (82.7782, -47.5782) radius 1.55
  circle A11 centre (86, -39.8) radius 1.55
  point P0 (0, 0)
  dimension "d77" = 360
extrude "돌출9" cut sketch "스케치13" against normal blind 10 contours A0 | A2 | A6 | A7 | A8 | A9 | A10 | A11
properties part number "부품49" material "PMMA 플라스틱"
